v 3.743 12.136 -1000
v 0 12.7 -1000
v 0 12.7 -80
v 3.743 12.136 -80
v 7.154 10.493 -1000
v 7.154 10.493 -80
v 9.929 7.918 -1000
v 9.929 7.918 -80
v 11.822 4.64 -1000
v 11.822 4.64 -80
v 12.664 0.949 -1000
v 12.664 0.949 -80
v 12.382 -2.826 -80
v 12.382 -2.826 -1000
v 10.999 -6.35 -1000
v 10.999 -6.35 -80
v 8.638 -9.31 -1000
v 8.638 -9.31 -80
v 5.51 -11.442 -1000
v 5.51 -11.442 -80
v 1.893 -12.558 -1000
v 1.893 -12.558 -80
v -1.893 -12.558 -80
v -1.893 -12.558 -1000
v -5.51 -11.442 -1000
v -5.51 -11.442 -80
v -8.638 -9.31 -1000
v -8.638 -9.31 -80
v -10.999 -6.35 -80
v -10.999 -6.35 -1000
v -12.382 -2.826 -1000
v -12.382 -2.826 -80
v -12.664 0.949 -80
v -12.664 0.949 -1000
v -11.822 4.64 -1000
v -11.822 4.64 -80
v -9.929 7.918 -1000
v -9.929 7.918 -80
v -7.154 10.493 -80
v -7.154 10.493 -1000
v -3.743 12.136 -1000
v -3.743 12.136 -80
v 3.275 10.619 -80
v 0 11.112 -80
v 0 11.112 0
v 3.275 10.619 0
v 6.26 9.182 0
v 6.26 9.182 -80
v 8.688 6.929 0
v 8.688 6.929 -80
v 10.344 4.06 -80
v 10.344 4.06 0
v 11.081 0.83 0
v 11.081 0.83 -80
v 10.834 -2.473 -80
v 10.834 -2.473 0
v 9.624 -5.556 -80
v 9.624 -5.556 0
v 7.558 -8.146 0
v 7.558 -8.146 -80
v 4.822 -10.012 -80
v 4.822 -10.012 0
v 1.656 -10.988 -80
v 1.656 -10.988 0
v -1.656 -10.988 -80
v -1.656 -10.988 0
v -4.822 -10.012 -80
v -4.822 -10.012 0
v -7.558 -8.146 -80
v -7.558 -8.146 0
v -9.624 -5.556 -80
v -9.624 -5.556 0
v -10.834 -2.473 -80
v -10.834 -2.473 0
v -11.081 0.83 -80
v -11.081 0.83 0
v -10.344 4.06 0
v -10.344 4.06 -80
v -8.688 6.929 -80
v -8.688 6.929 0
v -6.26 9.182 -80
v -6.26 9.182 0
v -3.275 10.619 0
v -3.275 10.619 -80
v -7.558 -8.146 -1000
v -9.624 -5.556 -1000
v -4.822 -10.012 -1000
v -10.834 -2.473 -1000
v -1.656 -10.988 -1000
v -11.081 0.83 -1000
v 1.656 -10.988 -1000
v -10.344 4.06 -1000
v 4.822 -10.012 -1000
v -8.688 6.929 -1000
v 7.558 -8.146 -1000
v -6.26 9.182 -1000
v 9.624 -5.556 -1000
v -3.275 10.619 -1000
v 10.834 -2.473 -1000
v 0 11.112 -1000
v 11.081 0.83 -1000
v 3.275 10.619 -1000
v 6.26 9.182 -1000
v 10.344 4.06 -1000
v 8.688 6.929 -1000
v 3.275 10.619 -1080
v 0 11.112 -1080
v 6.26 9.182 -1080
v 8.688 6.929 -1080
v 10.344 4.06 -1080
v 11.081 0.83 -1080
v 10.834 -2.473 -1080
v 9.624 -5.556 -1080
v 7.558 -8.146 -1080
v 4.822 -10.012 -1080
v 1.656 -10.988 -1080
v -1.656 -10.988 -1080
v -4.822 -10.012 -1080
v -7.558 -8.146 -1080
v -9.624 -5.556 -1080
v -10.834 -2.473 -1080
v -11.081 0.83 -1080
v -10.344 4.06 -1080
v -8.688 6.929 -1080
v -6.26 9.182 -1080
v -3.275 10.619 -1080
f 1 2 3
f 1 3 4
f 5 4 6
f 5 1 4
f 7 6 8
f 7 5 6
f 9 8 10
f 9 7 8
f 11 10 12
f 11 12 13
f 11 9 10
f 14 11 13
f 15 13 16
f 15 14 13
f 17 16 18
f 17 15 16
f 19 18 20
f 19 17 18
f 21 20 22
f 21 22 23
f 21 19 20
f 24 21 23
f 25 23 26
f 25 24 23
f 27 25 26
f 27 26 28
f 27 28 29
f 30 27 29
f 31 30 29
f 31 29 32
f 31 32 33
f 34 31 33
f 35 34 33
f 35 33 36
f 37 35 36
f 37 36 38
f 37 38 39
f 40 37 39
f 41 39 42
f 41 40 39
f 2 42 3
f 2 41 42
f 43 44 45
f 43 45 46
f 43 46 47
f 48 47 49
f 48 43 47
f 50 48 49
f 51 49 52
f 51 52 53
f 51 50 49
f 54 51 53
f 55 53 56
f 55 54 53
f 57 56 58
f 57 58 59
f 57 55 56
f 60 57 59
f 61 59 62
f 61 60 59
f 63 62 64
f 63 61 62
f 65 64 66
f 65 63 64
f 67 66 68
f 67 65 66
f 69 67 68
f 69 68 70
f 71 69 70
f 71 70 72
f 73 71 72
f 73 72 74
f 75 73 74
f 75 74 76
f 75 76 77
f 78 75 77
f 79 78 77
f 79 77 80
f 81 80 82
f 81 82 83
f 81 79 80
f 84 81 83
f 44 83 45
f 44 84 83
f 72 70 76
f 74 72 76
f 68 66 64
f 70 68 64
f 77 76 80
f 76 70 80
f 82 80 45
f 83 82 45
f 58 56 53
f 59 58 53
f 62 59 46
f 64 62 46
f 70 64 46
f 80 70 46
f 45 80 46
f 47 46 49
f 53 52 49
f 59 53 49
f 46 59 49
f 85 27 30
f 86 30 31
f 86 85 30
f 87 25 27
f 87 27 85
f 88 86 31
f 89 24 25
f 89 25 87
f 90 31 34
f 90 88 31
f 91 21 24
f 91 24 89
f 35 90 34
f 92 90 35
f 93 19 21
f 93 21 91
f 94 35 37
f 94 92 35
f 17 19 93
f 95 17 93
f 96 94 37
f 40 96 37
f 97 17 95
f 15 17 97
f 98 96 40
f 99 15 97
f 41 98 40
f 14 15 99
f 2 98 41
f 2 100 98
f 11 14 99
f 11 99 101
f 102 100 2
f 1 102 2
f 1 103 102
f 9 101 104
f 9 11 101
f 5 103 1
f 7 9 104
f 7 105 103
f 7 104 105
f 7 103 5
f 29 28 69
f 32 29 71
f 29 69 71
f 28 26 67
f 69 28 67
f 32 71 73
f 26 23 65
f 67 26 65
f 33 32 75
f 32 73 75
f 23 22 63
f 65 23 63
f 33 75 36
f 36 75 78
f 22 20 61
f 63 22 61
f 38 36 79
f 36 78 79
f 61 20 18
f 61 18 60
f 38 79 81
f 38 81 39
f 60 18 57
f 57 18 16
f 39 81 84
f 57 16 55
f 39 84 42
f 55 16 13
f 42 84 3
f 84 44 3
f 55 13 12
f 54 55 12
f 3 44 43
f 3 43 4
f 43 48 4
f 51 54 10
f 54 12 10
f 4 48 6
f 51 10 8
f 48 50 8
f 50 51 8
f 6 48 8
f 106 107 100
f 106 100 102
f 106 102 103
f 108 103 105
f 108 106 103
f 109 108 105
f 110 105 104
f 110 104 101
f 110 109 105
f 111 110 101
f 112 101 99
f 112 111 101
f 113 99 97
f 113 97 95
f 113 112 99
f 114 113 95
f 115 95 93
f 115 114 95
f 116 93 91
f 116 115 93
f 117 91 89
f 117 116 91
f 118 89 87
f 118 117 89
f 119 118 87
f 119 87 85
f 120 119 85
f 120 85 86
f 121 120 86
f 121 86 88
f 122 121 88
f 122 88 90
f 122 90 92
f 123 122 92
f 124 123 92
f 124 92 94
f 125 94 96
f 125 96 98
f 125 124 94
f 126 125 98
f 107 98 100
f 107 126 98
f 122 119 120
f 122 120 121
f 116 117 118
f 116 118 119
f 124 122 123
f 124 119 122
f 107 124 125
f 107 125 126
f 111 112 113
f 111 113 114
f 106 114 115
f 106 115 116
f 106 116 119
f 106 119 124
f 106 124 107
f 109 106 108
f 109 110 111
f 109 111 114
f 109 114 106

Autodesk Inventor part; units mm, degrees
ref_plane "YZ Plane" through (0, 0, 0) normal (1, 0, 0) x (0, 1, 0)
ref_plane "XZ Plane" through (0, 0, 0) normal (0, 1, 0) x (-1, 0, 0)
ref_plane "XY Plane" through (0, 0, 0) normal (0, 0, 1) x (1, 0, 0)
sketch "Sketch3" plane through (0, 0, 0) normal (1, 0, 0) x (0, 1, 0)
  line L0 (0, 0) -> (11.1125, 0)
  line L1 (11.1125, 0) -> (11.1125, -80)
  line L2 (11.1125, -80) -> (12.7, -80)
  line L3 (12.7, -80) -> (12.7, -1000)
  line L4 (12.7, -1000) -> (11.1125, -1000)
  line L5 (11.1125, -1000) -> (11.1125, -1080)
  line L6 (11.1125, -1080) -> (0, -1080)
  line L7 (0, 0) -> (0, -1080)
  dimension "d7" = 11.1125
  dimension "d8" = 80
  dimension "d9" = 1.5875
  dimension "d10" = 920
  dimension "d11" = 1.5875
  dimension "d12" = 80
  dimension "d13" = 11.1125
revolve "Revolution1" add sketch "Sketch3" angle 360 about axis through (0, 0, 0) along (0, 0, -1)
thread "Thread3" size "7/8-9 UNC" class "2A" standard "ANSI Unified Screw Threads" full length
thread "Thread4" size "7/8-9 UNC" class "2A" standard "ANSI Unified Screw Threads" length 80
equation "\"d11\" = d9"
equation "\"d12\" = d8"
equation "\"d13\" = d7"
properties part number "Barra de deslizamiento"
